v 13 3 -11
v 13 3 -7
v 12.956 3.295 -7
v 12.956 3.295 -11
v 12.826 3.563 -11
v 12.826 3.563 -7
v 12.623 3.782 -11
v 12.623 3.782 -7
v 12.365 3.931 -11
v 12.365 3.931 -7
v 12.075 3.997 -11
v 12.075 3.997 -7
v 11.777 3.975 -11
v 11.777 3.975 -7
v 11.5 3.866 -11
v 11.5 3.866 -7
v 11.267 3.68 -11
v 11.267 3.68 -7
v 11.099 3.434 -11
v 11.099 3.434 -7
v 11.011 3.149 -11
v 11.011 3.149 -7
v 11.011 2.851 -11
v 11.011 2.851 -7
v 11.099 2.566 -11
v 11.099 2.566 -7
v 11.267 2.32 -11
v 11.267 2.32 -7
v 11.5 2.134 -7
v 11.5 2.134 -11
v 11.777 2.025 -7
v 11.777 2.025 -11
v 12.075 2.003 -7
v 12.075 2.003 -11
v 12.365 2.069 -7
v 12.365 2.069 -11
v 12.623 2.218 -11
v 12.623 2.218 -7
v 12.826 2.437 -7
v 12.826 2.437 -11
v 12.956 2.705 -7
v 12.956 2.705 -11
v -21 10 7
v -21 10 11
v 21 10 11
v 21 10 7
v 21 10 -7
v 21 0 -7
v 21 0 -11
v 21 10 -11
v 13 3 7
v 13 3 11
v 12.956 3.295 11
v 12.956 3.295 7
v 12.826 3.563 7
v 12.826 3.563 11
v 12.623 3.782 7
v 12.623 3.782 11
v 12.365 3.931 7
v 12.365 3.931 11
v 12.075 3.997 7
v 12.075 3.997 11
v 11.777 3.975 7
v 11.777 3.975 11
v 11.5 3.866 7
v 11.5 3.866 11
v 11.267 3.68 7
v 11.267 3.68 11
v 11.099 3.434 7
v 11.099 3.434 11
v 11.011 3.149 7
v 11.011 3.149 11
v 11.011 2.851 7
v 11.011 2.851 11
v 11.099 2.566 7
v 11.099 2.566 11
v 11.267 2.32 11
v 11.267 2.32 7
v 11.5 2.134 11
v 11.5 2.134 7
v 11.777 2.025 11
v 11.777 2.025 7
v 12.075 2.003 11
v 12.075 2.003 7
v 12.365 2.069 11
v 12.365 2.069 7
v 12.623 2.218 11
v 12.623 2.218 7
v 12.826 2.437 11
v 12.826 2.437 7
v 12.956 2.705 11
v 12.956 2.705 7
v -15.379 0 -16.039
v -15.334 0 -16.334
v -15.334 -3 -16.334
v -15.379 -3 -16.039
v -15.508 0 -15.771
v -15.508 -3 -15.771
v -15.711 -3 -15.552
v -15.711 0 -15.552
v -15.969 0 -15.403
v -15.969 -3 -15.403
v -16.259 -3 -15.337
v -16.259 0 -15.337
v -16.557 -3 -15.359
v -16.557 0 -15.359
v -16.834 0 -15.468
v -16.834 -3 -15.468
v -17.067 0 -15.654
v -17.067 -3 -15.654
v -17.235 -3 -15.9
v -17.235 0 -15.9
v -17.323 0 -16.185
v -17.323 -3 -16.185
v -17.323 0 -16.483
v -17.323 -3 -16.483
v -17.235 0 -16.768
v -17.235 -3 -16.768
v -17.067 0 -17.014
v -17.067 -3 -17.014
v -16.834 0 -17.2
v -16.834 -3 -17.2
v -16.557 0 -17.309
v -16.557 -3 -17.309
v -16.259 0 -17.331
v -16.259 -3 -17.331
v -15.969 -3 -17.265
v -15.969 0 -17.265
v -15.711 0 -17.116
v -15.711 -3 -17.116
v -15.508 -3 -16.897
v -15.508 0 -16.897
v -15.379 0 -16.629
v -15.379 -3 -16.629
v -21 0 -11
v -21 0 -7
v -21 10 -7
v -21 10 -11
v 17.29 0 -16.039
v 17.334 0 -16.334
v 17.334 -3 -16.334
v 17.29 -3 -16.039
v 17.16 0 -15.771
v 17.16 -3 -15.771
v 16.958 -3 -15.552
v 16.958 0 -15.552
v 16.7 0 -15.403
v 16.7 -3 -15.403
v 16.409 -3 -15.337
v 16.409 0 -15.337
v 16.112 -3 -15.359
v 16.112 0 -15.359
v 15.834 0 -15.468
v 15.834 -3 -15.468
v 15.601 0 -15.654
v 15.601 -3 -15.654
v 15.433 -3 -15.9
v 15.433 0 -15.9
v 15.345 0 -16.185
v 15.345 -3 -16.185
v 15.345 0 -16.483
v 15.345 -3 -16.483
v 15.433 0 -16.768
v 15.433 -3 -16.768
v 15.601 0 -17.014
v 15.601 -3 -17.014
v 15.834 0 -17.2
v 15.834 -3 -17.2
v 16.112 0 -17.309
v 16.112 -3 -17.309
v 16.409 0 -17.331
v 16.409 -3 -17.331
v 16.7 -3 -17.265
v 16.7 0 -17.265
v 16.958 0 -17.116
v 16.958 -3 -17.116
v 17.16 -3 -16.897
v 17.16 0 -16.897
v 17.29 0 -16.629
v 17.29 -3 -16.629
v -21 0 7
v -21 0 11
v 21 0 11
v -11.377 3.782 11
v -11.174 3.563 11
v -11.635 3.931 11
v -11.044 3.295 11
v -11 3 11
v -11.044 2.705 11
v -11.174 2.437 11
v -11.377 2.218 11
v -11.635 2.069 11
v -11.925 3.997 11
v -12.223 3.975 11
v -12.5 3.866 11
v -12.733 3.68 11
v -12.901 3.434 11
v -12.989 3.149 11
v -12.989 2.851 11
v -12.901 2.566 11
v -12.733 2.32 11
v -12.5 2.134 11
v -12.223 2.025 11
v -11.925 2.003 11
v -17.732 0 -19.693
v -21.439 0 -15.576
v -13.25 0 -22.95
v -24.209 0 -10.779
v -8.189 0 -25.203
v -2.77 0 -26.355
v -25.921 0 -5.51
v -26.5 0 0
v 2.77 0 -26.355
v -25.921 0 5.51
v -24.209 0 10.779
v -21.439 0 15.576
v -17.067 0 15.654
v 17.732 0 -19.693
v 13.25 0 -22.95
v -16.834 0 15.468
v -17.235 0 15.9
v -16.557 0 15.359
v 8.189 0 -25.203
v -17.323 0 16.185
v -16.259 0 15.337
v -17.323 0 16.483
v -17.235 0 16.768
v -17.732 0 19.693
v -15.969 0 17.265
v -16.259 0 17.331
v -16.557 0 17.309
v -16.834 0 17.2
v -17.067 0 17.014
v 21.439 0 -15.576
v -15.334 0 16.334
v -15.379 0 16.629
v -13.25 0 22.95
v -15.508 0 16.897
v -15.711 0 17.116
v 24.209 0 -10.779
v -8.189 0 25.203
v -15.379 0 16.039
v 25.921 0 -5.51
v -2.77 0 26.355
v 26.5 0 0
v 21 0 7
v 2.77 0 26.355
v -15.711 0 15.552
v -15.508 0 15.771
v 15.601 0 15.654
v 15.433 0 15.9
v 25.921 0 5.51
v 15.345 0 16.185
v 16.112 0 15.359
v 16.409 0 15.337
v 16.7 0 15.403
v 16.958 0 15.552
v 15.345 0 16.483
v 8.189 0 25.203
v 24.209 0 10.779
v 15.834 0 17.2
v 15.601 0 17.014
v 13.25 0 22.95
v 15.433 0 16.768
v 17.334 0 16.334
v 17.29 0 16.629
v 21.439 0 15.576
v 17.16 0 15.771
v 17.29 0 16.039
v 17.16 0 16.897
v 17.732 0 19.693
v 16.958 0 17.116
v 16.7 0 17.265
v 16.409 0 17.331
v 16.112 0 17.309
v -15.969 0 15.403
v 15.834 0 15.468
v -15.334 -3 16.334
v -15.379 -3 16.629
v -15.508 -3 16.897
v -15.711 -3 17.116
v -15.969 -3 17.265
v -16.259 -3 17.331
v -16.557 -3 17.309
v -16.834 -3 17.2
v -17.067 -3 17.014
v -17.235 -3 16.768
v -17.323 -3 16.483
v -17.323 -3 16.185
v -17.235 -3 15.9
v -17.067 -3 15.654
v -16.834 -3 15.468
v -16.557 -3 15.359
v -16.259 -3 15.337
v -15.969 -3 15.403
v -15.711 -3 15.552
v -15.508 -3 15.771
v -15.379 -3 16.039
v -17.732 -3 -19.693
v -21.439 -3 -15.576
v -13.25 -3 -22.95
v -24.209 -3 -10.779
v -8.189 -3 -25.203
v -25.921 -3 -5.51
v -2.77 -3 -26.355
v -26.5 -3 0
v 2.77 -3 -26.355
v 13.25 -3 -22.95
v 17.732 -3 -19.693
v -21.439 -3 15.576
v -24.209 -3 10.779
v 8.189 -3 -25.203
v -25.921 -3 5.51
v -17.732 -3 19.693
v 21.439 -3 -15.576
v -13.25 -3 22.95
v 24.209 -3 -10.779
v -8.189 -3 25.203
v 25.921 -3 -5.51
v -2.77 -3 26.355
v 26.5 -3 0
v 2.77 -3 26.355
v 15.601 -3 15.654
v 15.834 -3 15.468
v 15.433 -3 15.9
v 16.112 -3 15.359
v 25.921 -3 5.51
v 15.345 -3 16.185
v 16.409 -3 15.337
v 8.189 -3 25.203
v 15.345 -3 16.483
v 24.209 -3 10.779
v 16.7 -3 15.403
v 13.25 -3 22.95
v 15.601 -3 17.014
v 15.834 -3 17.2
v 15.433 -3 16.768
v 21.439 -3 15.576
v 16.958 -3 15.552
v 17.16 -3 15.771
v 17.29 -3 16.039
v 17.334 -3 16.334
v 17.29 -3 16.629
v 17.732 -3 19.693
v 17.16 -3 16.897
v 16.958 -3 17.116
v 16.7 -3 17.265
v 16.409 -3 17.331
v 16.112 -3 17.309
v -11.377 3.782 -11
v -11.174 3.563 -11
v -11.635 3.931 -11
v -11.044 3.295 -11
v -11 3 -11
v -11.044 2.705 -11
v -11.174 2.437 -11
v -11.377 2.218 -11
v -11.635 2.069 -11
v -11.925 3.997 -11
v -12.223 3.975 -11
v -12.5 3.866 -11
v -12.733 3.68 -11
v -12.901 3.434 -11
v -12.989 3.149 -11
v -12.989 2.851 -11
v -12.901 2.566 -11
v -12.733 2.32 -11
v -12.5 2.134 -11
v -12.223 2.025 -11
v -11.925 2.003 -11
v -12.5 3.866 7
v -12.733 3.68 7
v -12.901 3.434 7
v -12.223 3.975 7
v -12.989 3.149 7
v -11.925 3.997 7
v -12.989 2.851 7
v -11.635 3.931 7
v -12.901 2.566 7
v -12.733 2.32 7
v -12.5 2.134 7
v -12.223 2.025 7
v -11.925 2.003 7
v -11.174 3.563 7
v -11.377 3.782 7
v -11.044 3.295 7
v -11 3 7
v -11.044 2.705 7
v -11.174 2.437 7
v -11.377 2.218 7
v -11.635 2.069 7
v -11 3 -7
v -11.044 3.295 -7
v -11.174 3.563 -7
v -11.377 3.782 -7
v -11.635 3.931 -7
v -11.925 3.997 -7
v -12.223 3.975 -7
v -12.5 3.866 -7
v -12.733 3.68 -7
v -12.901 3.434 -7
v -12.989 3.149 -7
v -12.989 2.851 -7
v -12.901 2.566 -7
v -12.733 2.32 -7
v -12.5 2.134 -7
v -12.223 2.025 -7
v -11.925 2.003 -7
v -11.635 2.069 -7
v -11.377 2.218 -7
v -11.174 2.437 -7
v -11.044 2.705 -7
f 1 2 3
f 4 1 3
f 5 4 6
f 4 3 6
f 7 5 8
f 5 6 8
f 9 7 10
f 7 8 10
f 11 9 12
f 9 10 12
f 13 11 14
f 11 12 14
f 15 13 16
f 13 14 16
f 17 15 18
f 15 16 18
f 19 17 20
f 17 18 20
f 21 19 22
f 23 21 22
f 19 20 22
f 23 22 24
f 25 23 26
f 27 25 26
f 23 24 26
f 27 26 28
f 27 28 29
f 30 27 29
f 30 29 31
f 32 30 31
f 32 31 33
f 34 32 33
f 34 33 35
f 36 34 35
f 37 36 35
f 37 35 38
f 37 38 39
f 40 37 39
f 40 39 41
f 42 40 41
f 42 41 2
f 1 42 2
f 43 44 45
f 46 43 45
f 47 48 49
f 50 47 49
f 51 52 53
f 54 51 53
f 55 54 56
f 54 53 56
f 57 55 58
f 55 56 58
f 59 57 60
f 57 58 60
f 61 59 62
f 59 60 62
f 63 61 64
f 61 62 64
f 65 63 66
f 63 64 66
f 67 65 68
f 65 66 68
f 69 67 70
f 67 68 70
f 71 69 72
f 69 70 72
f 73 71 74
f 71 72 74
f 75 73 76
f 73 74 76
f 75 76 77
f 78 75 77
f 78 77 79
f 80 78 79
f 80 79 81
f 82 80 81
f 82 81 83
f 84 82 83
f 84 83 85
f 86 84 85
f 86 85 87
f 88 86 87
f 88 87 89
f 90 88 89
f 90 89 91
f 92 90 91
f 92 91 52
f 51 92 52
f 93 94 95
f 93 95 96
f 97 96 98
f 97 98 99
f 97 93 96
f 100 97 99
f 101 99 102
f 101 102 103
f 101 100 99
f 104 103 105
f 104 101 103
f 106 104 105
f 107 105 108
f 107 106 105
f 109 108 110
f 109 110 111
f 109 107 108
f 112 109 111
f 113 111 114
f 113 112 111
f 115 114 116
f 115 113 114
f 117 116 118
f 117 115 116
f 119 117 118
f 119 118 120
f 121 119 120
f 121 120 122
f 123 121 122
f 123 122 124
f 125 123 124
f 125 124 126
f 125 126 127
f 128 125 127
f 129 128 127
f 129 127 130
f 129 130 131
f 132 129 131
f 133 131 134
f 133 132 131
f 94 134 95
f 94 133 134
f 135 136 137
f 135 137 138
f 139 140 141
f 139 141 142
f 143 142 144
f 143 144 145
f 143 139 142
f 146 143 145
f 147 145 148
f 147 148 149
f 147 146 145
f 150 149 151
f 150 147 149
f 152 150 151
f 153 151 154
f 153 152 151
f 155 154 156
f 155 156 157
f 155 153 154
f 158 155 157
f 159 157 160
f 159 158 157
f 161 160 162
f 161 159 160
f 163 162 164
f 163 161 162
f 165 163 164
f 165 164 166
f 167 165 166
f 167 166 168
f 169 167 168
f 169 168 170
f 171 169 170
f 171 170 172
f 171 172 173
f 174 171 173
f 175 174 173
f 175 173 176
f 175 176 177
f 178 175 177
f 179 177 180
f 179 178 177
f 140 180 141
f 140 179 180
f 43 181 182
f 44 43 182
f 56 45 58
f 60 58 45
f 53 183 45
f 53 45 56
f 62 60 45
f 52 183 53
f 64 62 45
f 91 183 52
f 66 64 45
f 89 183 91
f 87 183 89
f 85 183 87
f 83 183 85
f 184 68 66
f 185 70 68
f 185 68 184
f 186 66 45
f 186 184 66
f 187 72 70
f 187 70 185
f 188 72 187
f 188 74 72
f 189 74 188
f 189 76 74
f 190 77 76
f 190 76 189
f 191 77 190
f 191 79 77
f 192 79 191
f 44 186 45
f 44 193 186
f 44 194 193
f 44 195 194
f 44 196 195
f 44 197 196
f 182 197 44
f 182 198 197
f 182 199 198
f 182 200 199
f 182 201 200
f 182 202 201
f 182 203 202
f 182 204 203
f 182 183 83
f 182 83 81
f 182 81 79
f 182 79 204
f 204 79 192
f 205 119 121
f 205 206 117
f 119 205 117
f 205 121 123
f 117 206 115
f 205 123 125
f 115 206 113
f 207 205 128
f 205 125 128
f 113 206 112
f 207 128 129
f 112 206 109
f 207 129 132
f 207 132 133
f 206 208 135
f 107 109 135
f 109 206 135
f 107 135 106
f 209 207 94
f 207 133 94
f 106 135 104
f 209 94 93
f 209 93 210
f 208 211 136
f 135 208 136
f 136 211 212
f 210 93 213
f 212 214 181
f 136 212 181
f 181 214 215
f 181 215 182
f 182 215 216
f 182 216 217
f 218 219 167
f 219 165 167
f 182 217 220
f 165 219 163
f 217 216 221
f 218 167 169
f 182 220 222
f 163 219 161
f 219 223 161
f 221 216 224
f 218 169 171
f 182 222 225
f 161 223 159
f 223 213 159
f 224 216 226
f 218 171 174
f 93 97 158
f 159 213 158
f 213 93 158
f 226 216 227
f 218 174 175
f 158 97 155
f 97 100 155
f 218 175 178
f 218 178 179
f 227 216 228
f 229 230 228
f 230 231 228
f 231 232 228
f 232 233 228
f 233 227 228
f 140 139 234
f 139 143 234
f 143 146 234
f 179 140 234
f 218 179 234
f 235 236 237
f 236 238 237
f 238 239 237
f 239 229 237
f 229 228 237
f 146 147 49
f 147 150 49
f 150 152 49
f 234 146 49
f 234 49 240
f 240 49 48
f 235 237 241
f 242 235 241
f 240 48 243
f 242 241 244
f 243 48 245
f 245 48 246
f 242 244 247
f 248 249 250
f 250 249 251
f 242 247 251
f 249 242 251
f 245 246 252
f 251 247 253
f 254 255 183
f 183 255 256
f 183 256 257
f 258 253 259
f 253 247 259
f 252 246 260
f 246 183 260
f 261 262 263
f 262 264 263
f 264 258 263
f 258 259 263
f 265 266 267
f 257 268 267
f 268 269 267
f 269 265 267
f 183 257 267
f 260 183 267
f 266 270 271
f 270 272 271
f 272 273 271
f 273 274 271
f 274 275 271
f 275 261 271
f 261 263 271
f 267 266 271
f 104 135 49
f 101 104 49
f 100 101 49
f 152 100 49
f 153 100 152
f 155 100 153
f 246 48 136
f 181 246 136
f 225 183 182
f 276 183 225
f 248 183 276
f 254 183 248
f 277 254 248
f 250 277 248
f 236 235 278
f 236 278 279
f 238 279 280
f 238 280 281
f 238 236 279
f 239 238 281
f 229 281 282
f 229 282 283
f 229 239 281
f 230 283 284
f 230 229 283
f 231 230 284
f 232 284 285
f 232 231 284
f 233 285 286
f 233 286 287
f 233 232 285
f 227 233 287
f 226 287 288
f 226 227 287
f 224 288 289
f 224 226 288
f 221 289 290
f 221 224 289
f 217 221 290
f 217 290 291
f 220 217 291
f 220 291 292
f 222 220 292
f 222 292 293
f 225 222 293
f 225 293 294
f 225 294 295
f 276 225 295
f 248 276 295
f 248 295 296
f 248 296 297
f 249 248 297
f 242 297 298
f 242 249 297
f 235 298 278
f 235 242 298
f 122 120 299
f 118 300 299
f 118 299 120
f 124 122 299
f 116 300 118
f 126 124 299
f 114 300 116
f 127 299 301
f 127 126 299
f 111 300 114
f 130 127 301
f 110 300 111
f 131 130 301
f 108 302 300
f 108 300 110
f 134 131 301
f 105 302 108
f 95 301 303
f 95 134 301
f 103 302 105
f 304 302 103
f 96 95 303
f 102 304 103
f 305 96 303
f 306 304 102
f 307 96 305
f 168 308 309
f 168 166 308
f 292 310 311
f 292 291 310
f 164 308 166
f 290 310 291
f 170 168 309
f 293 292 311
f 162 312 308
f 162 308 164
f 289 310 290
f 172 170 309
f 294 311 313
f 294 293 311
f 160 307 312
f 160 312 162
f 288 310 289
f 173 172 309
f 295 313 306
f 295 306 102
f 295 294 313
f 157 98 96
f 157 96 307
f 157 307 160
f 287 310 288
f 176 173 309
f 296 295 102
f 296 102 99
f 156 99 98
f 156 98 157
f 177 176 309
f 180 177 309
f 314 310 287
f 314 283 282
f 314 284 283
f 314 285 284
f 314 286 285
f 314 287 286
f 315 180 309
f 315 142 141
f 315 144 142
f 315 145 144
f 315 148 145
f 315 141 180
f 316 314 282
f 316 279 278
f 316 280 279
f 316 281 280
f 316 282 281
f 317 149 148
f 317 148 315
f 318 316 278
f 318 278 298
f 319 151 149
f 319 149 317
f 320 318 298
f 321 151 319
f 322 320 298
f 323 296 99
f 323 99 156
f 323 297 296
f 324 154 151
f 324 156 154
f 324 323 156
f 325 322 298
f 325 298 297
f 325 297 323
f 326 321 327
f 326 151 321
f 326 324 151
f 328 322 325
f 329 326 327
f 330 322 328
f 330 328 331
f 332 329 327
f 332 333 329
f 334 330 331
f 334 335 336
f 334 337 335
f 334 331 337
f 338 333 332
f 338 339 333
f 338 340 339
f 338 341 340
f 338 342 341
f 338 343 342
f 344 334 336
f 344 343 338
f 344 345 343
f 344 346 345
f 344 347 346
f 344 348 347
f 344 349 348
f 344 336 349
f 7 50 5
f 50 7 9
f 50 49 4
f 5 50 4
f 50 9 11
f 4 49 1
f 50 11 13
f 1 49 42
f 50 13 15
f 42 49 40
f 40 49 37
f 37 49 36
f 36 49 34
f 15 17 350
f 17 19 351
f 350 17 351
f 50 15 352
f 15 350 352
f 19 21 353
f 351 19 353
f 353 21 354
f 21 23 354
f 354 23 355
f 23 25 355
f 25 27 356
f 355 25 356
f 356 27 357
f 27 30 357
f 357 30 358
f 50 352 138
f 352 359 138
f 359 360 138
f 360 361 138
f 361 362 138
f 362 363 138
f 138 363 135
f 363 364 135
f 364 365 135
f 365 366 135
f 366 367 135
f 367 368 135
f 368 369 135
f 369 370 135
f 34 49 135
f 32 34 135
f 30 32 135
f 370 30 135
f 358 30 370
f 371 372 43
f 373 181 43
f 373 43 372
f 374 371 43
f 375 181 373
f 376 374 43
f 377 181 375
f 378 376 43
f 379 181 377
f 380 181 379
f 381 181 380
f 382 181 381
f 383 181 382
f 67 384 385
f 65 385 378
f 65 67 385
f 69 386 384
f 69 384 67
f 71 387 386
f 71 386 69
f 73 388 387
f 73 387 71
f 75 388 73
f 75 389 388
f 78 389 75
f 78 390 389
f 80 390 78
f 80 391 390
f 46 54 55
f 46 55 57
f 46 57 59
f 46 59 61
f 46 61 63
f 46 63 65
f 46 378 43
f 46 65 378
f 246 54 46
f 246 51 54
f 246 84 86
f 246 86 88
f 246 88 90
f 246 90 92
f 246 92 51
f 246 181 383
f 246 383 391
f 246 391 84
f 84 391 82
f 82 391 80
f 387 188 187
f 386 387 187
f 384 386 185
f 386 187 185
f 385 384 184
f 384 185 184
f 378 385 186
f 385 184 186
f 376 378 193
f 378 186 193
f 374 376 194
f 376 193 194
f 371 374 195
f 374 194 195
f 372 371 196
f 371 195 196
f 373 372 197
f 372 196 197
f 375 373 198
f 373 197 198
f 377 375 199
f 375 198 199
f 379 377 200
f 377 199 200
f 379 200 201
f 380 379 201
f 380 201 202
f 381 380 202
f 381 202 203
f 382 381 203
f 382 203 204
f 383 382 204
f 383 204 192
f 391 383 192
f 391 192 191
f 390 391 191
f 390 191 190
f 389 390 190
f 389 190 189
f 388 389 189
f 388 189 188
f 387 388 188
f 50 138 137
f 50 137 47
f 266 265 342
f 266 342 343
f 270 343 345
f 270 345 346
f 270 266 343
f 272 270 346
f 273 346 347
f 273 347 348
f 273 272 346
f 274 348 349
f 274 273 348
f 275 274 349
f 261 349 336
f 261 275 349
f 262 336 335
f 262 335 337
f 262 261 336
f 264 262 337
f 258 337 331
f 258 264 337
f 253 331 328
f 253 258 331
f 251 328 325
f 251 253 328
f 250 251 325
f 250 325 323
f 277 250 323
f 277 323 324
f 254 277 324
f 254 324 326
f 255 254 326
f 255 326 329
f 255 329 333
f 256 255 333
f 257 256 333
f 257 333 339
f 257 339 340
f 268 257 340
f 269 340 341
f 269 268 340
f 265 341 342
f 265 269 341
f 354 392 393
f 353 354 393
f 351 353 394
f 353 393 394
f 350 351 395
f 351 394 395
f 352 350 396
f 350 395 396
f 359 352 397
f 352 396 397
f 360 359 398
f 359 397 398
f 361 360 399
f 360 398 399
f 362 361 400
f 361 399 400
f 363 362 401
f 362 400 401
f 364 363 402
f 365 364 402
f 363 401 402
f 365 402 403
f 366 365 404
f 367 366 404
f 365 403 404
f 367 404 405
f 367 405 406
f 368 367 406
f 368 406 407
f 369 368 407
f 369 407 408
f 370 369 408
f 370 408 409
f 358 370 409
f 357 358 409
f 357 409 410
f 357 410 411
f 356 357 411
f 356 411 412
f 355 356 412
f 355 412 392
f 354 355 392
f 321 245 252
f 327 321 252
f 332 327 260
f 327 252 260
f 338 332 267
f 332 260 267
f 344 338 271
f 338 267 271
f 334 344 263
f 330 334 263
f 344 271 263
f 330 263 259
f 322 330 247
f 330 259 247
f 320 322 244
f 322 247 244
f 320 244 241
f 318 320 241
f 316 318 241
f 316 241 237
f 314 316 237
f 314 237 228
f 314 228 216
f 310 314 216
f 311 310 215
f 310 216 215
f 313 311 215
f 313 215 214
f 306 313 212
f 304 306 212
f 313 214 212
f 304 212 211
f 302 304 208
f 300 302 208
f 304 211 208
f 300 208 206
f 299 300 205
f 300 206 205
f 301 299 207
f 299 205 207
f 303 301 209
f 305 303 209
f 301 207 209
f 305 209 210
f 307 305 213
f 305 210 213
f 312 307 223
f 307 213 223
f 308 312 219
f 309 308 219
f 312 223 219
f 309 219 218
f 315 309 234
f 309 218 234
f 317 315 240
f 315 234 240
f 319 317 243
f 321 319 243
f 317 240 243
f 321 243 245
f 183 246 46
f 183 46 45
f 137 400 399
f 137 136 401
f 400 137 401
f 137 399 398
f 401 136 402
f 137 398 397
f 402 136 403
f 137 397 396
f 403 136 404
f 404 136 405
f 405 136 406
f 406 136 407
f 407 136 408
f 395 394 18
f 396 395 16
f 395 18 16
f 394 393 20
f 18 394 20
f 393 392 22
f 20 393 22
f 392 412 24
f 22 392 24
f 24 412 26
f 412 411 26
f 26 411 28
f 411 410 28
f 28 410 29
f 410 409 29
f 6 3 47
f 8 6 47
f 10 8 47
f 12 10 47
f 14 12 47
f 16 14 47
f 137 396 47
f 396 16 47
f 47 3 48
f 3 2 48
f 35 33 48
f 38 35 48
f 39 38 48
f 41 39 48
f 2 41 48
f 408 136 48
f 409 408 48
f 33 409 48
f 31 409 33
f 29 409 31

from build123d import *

# Parameters (mm, degrees)
F0_W     = 21
F0_H     = 4
F0_R     = 26.5
F0_R_2   = 1
F1_DEPTH = 3
F2_DEPTH = 10
F4_R     = 1
F5_DEPTH = 37.501


with BuildPart() as f1:
    # F0 (on Front) → F1 (new body)
    with BuildSketch(Plane.XZ):
        with Locations((10.5, 9)):
            Rectangle(F0_W, F0_H)
        with Locations((-10.5, 9)):
            Rectangle(F0_W, F0_H)
        Circle(F0_R)
        with Locations((-16.334167, -16.334167)):
            Circle(F0_R_2, mode=Mode.SUBTRACT)
        with Locations((16.334167, -16.334167)):
            Circle(F0_R_2, mode=Mode.SUBTRACT)
        with Locations((-16.334167, 16.334167)):
            Circle(F0_R_2, mode=Mode.SUBTRACT)
        Polygon((21, 7), (0, 7), (-21, 7), (-21, 11), (0, 11), (21, 11), align=None, mode=Mode.SUBTRACT)
        with Locations((16.334167, 16.334167)):
            Circle(F0_R_2, mode=Mode.SUBTRACT)
    extrude(amount=F1_DEPTH)

    # F0 (on Front) → F2 (join)
    with BuildSketch(Plane.XZ):
        with Locations((10.5, 9)):
            Rectangle(F0_W, F0_H)
        with Locations((-10.5, 9)):
            Rectangle(F0_W, F0_H)
    extrude(amount=-F2_DEPTH)

    # F3: F1 across plane


with BuildPart() as f1_1:
    add(f1.part)
    add(f1.part.mirror(Plane.XY))

    # F4 (on face) → F5 (cut, through all)
    with BuildSketch(Plane.XY.offset(11)):
        with Locations((-12, 3)):
            Circle(F4_R)
        with Locations((12, 3)):
            Circle(F4_R)
    extrude(amount=-F5_DEPTH, mode=Mode.SUBTRACT)


solid = f1_1.part
